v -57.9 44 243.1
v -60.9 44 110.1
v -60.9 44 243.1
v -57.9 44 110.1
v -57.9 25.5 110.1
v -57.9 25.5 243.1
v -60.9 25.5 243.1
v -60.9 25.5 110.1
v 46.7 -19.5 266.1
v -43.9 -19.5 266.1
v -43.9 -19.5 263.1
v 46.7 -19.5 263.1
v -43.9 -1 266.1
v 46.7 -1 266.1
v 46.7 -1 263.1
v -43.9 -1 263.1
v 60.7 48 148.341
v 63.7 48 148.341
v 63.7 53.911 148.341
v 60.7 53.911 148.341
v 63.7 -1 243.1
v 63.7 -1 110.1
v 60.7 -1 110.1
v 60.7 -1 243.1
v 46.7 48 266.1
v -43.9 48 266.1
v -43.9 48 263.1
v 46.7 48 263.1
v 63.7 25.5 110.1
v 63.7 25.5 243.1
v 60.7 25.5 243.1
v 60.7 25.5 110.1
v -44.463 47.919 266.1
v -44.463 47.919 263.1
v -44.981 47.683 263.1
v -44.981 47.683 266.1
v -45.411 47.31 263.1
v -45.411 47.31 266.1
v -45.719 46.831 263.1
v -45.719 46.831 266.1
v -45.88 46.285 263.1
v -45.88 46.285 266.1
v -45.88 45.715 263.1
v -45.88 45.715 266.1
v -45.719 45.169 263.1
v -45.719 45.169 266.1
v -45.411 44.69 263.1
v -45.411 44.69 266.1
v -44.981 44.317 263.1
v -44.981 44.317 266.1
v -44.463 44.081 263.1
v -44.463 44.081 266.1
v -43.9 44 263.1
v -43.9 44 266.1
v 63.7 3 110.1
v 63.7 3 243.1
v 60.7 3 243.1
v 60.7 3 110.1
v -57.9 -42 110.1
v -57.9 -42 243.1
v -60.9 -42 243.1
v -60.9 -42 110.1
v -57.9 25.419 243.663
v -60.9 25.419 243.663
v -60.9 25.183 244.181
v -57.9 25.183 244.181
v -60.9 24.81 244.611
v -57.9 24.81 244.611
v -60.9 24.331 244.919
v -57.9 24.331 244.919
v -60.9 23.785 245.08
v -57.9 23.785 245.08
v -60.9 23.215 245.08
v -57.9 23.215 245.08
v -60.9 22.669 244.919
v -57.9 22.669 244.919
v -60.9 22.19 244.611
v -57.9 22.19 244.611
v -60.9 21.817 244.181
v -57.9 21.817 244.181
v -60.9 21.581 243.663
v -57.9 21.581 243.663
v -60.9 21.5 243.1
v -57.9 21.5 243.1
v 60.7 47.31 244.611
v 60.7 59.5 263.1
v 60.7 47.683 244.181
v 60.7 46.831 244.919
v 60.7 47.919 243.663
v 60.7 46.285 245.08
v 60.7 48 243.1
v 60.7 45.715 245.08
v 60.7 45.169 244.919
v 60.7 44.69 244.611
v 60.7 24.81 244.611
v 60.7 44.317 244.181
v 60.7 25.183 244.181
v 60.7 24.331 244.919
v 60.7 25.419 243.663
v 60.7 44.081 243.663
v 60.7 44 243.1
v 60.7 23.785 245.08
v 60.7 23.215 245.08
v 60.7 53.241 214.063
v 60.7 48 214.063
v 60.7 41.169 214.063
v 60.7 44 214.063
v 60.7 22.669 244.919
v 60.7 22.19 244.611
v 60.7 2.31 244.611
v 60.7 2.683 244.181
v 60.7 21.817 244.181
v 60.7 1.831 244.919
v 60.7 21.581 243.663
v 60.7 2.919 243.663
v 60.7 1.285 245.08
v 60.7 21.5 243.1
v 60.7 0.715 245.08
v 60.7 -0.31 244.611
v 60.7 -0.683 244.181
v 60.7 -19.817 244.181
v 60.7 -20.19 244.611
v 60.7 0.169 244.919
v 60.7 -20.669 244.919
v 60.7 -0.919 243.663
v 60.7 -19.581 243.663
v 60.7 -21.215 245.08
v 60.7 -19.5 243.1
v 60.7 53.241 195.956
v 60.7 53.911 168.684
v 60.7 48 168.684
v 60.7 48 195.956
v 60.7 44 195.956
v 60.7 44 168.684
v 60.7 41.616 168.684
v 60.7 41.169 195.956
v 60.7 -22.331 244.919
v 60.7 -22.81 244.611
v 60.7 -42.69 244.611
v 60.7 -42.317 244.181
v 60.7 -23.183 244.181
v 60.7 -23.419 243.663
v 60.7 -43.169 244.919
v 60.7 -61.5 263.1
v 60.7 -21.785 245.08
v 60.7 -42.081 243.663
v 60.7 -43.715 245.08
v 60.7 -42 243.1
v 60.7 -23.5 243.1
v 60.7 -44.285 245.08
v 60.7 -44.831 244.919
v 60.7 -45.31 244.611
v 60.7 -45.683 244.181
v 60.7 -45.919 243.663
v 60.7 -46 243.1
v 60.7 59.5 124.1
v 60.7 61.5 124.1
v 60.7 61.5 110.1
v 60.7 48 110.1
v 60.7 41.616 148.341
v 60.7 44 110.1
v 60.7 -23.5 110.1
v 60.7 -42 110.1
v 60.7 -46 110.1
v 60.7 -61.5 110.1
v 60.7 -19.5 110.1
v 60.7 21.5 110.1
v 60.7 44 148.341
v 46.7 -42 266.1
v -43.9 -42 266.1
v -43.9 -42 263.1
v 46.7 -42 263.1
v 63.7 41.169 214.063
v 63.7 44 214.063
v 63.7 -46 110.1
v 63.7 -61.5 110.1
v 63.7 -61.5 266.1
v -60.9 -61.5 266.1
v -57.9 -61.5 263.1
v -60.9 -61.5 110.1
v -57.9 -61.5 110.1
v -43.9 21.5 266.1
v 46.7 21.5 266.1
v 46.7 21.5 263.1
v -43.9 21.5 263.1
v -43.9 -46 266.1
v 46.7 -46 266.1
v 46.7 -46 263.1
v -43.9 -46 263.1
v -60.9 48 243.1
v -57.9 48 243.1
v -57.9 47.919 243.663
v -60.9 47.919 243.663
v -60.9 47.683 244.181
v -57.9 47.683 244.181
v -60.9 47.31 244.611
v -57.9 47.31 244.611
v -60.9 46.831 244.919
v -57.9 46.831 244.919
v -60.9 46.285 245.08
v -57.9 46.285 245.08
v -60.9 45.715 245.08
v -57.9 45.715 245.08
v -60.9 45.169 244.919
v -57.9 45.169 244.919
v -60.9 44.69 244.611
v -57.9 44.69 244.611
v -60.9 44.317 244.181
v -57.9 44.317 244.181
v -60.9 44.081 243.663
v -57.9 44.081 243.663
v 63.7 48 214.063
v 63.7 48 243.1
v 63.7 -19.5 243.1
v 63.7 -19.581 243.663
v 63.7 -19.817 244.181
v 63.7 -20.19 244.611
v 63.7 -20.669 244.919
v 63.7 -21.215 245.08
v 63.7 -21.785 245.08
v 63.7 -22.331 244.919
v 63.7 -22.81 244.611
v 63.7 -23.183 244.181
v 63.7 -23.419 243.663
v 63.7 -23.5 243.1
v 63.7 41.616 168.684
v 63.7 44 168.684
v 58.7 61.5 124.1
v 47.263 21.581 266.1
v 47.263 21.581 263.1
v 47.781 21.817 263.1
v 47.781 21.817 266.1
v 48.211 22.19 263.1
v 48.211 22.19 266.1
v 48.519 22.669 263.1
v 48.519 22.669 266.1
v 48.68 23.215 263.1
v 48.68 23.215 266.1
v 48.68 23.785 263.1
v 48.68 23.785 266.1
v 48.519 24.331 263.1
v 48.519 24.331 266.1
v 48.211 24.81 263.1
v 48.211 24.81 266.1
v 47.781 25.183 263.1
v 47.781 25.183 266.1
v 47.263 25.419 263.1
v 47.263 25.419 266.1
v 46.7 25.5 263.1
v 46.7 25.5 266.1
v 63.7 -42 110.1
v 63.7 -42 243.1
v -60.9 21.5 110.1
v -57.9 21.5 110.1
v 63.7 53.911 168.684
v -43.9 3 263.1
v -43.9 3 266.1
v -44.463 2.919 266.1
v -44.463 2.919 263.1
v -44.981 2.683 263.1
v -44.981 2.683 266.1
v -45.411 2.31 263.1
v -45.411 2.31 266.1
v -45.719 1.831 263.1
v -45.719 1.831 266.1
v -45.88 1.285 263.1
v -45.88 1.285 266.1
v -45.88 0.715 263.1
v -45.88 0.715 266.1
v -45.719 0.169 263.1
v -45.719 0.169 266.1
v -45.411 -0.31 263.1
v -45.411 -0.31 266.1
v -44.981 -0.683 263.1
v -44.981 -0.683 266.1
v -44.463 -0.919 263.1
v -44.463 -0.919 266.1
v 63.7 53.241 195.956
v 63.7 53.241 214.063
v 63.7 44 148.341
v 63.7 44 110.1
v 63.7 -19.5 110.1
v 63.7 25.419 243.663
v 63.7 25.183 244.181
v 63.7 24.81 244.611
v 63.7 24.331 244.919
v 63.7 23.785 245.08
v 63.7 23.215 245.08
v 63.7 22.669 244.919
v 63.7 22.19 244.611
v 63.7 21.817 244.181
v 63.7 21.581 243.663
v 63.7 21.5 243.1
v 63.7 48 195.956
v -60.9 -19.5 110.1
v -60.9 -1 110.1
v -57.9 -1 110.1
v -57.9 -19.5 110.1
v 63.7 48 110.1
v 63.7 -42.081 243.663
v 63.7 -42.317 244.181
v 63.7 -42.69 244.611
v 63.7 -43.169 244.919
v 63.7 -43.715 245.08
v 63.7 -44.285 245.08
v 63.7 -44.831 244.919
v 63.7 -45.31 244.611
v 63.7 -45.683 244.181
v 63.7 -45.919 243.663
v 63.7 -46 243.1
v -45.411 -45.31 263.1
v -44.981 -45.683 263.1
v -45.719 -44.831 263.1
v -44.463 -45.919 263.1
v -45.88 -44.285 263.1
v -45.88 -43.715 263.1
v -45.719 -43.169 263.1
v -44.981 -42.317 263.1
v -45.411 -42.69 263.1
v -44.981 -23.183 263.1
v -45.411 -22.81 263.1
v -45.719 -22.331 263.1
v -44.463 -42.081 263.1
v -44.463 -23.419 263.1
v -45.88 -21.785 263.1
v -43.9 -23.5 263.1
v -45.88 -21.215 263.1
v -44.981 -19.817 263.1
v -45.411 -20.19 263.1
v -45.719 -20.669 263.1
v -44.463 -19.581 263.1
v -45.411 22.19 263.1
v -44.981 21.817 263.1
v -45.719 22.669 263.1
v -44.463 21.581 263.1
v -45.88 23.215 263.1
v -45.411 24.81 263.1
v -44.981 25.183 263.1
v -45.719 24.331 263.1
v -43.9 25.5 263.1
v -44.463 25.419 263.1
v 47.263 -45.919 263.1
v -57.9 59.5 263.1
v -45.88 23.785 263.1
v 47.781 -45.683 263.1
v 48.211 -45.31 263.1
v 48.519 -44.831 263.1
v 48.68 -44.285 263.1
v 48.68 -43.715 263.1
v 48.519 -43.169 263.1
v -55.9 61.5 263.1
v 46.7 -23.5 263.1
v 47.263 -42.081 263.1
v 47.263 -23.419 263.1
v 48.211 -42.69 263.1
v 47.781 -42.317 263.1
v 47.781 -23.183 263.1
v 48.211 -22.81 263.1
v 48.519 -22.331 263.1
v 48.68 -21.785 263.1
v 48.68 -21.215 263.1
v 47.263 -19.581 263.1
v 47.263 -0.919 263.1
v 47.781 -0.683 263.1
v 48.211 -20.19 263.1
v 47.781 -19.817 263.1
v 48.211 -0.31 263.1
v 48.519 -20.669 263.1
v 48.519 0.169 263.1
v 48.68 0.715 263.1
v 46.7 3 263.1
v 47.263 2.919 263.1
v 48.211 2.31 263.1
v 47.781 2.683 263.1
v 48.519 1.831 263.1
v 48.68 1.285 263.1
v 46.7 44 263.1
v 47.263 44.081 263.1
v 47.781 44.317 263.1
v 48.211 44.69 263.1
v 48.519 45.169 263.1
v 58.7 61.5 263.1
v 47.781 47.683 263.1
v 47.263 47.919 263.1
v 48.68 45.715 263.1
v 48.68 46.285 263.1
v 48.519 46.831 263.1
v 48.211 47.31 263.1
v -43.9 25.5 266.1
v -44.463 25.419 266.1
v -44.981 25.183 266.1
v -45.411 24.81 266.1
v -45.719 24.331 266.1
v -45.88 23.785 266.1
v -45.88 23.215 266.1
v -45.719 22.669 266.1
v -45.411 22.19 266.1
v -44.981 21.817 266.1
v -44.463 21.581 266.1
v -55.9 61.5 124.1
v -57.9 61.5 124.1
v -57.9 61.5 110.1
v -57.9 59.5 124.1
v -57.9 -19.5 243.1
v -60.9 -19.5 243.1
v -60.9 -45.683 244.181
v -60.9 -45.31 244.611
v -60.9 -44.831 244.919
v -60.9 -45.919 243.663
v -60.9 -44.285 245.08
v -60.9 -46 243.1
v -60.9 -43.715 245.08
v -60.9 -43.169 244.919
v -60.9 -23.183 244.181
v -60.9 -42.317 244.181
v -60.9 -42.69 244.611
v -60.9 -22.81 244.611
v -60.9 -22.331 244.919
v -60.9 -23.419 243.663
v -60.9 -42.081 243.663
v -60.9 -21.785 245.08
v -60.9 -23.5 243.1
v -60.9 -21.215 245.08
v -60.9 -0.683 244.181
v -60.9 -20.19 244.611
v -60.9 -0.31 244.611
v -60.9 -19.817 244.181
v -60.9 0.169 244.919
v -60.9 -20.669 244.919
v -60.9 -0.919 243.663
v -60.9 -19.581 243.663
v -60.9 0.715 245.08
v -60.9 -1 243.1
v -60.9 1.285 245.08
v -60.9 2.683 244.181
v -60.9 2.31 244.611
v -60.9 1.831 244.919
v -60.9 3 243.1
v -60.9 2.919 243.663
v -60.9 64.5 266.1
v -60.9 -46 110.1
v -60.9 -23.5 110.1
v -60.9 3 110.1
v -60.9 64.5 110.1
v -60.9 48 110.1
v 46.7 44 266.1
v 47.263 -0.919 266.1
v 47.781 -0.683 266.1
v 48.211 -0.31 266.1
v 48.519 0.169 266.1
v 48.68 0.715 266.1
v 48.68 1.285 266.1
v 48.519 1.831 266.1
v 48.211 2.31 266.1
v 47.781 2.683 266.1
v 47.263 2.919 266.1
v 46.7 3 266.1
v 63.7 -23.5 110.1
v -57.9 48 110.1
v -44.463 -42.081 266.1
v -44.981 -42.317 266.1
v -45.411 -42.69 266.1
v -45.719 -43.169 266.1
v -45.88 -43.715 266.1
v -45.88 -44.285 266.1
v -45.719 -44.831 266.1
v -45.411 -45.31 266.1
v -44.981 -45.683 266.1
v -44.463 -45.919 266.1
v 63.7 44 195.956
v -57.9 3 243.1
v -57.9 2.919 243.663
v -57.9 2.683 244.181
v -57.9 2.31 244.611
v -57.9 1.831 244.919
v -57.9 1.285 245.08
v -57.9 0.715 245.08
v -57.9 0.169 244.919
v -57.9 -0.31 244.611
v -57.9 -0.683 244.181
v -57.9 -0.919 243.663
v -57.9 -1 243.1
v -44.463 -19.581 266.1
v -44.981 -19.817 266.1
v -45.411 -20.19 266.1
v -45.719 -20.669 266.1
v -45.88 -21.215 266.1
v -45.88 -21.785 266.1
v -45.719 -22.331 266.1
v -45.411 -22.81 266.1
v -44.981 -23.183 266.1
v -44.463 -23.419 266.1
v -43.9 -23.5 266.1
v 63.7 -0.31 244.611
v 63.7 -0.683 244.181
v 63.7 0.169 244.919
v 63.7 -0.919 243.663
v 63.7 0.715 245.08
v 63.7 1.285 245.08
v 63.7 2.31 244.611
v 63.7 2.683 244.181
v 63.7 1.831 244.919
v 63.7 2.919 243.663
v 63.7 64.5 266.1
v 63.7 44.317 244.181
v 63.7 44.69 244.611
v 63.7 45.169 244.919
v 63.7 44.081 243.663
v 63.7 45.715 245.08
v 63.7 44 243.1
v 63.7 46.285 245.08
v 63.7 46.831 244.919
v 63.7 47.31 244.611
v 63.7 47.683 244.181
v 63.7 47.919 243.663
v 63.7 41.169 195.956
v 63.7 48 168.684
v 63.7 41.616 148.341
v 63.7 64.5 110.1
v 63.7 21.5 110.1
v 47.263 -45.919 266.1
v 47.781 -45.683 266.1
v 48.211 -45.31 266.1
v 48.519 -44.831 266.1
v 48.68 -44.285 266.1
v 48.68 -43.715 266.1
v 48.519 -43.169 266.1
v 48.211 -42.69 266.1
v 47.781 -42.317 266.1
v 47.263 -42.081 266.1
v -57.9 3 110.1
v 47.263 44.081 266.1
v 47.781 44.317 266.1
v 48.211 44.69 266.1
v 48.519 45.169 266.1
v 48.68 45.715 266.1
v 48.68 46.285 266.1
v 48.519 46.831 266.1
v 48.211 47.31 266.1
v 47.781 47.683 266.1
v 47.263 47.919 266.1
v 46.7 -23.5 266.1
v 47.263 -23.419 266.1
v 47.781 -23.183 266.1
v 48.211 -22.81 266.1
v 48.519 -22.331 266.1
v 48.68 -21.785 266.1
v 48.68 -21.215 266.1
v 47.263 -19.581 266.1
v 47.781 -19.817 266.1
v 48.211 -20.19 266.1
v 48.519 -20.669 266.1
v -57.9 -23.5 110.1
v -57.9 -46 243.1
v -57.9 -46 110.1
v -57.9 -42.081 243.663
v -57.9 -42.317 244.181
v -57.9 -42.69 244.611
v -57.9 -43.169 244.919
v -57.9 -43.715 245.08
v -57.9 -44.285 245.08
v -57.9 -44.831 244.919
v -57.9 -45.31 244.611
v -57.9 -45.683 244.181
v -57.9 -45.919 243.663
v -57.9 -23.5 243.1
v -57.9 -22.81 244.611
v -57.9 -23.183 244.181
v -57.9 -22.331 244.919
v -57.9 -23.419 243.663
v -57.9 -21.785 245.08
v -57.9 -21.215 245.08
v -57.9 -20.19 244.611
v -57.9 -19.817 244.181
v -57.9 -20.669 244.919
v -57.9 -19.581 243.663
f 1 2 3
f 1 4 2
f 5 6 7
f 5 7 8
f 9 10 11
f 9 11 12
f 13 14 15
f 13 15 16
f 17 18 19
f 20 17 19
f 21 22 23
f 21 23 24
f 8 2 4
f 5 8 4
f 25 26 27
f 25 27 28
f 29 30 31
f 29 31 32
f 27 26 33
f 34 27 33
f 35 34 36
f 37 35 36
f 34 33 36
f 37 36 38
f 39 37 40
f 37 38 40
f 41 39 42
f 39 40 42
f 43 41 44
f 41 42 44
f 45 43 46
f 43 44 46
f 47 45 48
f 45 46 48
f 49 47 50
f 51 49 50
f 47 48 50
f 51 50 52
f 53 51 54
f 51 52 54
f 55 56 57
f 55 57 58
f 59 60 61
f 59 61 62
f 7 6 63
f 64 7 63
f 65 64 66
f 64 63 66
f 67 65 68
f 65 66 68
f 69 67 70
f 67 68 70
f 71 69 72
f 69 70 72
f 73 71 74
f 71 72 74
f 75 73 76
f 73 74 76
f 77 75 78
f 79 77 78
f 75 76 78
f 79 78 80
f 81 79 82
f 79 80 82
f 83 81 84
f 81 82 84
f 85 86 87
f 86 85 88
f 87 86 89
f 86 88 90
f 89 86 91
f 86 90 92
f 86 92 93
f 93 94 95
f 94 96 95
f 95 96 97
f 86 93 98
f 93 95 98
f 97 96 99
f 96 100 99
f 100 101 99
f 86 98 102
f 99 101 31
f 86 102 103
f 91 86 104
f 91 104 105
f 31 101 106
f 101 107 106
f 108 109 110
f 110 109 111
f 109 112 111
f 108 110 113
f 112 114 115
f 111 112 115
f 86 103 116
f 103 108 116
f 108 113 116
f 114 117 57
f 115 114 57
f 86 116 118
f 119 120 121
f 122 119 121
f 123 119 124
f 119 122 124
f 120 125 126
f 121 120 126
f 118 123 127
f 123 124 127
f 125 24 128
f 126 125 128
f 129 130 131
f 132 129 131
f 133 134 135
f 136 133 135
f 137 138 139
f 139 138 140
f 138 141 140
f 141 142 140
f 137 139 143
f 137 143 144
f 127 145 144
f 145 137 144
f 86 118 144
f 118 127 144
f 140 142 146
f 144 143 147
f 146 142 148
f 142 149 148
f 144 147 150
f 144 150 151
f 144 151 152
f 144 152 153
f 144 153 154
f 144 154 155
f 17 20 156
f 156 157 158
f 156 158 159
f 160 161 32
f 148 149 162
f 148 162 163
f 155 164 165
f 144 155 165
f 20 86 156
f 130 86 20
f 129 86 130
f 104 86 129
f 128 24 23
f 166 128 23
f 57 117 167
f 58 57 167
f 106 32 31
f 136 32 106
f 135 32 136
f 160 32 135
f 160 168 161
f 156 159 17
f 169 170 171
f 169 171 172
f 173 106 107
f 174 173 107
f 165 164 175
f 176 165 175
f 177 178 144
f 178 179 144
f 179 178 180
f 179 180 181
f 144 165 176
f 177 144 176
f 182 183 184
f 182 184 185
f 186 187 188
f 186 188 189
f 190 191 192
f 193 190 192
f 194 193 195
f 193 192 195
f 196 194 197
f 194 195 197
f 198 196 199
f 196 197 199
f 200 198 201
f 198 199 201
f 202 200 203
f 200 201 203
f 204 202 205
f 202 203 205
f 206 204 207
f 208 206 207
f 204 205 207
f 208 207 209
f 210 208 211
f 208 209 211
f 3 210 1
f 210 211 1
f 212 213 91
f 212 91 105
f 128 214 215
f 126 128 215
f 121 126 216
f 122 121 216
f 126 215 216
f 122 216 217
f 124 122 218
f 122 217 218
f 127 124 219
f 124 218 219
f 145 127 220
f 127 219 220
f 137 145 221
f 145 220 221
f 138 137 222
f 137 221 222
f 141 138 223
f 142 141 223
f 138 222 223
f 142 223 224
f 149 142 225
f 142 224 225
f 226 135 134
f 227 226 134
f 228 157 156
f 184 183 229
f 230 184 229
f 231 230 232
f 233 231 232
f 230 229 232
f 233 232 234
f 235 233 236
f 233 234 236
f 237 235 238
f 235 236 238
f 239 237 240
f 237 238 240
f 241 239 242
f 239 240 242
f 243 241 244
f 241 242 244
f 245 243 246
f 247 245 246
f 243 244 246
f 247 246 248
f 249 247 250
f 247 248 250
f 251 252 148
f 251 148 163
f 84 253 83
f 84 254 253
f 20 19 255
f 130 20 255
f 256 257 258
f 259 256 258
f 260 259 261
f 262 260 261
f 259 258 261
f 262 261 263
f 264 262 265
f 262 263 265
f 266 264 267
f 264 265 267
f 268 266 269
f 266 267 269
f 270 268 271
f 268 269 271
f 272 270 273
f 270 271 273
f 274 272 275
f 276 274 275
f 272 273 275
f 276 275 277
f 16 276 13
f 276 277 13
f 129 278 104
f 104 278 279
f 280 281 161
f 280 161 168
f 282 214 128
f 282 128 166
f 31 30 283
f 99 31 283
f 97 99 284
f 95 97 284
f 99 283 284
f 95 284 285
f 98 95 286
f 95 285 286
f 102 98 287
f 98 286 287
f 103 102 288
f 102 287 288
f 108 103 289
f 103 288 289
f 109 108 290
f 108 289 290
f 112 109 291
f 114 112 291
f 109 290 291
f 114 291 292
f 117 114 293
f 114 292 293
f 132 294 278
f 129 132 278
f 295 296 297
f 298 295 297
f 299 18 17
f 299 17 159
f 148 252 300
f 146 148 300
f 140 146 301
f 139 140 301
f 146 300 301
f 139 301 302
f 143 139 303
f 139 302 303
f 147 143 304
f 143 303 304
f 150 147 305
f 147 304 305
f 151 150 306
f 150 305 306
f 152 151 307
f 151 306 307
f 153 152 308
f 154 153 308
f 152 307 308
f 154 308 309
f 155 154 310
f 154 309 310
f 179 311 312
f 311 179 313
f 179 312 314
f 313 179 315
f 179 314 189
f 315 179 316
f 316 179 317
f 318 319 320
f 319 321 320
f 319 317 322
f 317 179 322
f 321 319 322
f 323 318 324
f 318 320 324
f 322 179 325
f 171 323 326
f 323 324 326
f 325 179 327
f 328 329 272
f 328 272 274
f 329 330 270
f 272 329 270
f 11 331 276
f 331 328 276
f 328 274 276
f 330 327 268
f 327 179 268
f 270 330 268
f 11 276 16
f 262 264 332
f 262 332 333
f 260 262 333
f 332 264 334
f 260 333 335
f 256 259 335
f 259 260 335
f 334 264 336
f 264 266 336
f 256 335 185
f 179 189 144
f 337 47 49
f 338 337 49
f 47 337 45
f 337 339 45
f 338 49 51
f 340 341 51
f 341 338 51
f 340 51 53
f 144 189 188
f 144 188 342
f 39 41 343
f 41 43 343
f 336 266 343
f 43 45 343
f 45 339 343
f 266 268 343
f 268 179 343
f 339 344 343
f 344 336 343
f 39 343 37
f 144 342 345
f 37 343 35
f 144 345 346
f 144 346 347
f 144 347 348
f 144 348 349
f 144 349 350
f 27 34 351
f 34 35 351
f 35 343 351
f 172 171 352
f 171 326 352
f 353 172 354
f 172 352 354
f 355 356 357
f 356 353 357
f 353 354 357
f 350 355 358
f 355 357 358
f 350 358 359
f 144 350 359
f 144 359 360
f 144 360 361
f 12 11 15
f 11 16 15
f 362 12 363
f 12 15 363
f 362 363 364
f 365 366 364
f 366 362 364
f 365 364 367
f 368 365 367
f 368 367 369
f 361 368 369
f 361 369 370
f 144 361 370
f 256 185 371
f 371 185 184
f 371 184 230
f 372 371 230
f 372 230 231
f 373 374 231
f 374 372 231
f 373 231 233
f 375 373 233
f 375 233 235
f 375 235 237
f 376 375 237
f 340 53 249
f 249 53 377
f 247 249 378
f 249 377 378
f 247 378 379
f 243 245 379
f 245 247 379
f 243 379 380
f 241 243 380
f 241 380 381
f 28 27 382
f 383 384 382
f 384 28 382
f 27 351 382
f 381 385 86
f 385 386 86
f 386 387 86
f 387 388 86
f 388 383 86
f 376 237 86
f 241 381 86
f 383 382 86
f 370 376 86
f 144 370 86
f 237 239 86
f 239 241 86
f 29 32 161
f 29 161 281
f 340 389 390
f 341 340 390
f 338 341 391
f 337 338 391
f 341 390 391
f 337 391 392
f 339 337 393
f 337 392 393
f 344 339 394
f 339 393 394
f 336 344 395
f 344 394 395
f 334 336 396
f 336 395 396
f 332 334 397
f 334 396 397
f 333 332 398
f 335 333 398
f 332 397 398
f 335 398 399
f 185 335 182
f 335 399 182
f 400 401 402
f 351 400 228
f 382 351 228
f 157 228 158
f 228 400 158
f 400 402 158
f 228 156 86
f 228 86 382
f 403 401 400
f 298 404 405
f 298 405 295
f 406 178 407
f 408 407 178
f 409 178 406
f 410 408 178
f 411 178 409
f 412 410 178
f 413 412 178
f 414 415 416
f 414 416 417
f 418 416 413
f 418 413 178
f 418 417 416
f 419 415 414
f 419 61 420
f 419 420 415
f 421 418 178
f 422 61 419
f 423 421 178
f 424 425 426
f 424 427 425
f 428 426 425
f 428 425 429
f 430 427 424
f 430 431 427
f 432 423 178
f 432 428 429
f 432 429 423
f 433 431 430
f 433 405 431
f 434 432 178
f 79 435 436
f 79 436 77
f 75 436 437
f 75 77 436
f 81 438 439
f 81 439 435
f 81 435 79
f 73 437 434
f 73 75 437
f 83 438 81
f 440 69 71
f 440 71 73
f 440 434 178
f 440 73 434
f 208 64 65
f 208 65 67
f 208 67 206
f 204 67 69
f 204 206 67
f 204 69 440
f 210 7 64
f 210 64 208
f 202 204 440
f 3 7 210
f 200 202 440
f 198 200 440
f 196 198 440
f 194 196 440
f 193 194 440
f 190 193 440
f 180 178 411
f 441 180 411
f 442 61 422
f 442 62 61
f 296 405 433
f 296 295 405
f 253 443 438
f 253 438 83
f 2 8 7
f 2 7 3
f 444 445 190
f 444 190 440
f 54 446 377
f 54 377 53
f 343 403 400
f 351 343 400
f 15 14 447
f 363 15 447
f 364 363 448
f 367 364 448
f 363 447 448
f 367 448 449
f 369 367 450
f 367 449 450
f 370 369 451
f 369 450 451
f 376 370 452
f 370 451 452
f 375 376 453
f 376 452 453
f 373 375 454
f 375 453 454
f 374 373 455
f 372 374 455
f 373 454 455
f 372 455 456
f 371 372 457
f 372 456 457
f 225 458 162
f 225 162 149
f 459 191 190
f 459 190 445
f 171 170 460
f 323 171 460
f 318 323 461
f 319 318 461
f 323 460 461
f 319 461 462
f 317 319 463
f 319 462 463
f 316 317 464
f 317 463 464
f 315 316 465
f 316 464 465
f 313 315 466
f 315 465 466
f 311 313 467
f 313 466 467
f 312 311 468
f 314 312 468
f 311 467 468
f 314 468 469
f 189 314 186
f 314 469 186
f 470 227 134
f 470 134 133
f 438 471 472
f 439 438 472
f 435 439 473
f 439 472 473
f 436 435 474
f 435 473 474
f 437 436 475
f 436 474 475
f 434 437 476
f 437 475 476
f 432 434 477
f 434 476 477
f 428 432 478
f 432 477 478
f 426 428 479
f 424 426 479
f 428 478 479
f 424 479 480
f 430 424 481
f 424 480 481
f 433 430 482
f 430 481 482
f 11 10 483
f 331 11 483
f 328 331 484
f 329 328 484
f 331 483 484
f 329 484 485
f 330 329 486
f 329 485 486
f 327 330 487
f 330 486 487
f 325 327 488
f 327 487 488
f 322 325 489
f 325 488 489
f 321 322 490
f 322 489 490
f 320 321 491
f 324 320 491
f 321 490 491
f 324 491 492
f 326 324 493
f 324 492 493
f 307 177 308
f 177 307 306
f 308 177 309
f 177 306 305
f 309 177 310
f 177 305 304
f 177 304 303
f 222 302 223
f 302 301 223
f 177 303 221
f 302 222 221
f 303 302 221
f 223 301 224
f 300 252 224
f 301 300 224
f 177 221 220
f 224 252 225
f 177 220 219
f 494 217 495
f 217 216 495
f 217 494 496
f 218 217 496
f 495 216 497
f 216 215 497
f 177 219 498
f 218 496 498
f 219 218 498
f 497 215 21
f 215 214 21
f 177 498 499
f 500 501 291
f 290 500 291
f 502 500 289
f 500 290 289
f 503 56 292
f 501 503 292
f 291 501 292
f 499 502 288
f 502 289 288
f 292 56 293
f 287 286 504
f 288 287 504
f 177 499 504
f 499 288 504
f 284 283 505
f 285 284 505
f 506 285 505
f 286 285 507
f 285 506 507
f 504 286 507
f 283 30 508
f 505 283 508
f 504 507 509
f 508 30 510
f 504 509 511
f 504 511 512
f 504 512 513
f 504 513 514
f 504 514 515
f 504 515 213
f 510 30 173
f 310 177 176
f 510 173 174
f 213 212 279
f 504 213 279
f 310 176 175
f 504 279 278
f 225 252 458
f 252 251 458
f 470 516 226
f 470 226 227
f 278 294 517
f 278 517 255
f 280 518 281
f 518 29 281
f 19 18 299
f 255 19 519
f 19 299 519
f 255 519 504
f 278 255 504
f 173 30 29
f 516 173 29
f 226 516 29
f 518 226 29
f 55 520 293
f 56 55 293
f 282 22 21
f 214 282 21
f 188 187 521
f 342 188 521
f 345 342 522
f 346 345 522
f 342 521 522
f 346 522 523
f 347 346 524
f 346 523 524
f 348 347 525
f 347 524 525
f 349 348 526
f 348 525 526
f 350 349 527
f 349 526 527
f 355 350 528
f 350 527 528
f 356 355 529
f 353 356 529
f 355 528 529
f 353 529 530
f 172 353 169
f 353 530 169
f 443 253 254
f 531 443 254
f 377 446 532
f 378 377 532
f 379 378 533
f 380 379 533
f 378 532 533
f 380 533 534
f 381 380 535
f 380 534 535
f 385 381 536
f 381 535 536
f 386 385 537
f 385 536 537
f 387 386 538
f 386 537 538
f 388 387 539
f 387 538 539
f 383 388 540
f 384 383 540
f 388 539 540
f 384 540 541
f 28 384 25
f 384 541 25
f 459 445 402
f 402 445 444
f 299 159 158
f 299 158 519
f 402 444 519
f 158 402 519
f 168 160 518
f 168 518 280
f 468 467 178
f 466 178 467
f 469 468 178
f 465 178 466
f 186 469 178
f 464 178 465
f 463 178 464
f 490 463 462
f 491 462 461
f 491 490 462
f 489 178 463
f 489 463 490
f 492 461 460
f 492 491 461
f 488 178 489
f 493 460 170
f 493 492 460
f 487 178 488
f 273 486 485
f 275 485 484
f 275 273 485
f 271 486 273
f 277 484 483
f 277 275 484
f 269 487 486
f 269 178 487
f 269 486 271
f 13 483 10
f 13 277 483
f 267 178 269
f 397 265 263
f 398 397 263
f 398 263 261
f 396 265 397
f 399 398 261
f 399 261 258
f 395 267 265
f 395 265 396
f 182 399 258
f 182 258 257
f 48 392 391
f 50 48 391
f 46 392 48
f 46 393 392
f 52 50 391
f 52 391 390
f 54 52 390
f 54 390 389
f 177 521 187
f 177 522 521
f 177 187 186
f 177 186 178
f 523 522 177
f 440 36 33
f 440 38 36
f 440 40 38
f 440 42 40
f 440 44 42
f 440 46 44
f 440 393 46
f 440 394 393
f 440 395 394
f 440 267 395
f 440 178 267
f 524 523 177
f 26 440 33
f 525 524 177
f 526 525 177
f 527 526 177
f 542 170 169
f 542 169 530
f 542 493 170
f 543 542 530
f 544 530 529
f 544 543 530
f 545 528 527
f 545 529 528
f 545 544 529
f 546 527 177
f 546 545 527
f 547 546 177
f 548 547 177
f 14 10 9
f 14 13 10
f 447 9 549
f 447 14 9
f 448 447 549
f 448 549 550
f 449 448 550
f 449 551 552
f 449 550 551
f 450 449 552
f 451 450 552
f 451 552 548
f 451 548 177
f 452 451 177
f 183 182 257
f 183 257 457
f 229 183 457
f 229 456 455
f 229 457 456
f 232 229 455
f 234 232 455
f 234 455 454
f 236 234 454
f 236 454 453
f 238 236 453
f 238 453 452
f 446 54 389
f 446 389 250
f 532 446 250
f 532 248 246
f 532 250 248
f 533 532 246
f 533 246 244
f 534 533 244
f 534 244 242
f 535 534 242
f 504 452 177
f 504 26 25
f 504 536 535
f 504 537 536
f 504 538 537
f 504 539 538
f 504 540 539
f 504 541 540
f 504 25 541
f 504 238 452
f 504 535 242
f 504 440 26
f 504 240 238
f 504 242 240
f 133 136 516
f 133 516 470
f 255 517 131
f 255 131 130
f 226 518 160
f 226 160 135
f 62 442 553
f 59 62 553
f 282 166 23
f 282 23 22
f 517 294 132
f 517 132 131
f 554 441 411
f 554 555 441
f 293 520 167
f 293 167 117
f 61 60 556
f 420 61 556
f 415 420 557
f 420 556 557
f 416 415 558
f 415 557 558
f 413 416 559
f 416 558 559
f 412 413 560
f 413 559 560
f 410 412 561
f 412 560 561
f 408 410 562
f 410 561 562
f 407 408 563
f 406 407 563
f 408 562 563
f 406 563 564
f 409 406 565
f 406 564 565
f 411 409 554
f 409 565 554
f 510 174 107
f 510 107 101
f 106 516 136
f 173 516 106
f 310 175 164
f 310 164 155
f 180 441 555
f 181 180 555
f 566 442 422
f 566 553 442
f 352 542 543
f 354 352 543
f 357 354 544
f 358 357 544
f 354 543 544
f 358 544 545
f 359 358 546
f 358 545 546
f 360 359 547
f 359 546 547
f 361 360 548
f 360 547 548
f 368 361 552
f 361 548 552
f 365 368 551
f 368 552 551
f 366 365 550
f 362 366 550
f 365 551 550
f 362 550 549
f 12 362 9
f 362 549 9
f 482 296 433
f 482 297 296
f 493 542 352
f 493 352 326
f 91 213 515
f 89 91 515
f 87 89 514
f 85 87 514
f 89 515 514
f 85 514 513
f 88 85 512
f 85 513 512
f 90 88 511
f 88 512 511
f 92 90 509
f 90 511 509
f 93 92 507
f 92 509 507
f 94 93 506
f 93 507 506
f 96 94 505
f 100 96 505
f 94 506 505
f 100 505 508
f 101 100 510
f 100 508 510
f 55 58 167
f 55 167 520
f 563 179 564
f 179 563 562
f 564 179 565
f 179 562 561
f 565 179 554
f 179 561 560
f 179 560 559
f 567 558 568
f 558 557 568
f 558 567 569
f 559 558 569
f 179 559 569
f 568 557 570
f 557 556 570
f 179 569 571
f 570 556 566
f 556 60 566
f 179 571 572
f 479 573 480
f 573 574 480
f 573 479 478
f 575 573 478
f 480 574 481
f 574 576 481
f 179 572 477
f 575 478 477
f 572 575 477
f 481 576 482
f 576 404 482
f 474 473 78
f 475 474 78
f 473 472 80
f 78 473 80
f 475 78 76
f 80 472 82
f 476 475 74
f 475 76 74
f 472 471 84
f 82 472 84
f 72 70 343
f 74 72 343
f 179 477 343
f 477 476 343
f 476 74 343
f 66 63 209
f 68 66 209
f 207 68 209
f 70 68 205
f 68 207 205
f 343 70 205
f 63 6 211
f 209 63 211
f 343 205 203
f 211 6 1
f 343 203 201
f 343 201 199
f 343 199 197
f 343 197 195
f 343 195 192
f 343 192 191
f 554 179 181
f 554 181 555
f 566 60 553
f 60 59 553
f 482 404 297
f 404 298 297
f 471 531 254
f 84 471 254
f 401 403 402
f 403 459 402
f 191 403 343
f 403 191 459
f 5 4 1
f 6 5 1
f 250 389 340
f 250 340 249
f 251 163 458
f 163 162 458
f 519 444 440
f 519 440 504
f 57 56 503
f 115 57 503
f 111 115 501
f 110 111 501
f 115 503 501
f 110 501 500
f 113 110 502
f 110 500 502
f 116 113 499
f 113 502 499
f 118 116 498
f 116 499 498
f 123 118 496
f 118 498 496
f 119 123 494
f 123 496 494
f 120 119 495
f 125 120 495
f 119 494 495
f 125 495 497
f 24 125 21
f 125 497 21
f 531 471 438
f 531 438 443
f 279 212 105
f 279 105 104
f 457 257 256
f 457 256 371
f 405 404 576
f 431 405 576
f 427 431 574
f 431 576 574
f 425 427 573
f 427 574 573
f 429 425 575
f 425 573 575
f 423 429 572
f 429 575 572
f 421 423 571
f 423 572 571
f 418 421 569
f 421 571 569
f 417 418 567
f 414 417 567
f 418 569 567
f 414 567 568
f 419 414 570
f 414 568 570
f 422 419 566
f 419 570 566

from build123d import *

# Parameters (mm, degrees)
PAD004_DEPTH           = 153
PAD005_DEPTH           = 139
SKETCH007_W            = 124.6
SKETCH007_H            = 126
PAD006_DEPTH           = 3
POCKET002_DEPTH        = 124.601
LINEARPATTERN001_COUNT = 5
LINEARPATTERN001_PITCH = 22.5
POCKET003_DEPTH        = 4
LINEARPATTERN002_COUNT = 5
LINEARPATTERN002_PITCH = 22.5
SKETCH015_R            = 2
POCKET006_DEPTH        = 5
SKETCH016_W            = 12.294895
SKETCH016_H            = 20.342453
SKETCH016_W_2          = 12.071362
SKETCH016_H_2          = 18.107025
POCKET008_DEPTH        = 5


with BuildPart() as part:
    # Sketch006 → Pad004 (new body)
    with BuildSketch(Plane.XY):
        Polygon((62.3, 64.5), (-62.3, 64.5), (-62.3, -61.5), (-59.3, -61.5), (-59.3, 61.5), (59.3, 61.5), (59.3, -61.5), (62.3, -61.5), align=None)
    extrude(amount=PAD004_DEPTH)

    # Sketch008 (on DatumPlane) → Pad005 (join)
    with BuildSketch(Plane.XY.offset(153)):
        Polygon((-59.3, 59.5), (-57.299999, 61.5), (-59.3, 61.5), align=None)
    pad005 = extrude(amount=-PAD005_DEPTH)

    # Mirrored001: Pad005 across Sketch008 V_Axis
    add(pad005.mirror(Plane(origin=(0, 0, 153), x_dir=(0, 0, 1), z_dir=(1, 0, 0))))

    # Sketch007 (on DatumPlane) → Pad006 (join)
    with BuildSketch(Plane.XY.offset(153)):
        with Locations((0, 1.5)):
            Rectangle(SKETCH007_W, SKETCH007_H)
    extrude(amount=PAD006_DEPTH)

    # Sketch010 (on DatumPlane) → Pocket002 (cut, through all)
    with BuildSketch(Plane.YZ.offset(62.3)):
        with BuildLine():
            Line((-46, -89.527603), (-46, 133))
            ThreePointArc((-42, 133), (-44, 135), (-46, 133))
            Line((-42, 133), (-42, -89.527603))
            ThreePointArc((-46, -89.527603), (-44, -91.527603), (-42, -89.527603))
        make_face()
    pocket002 = extrude(amount=-POCKET002_DEPTH, mode=Mode.SUBTRACT)

    # LinearPattern001: Pocket002 ×5
    with Locations(*[(0, i * LINEARPATTERN001_PITCH, 0) for i in range(1, LINEARPATTERN001_COUNT)]):
        add(pocket002, mode=Mode.SUBTRACT)

    # Sketch011 (on Face13 of Pad006) → Pocket003 (cut)
    with BuildSketch(Plane.XY.offset(156)):
        with BuildLine():
            Line((-45.3, -42), (45.3, -42))
            ThreePointArc((45.3, -46), (47.3, -44), (45.3, -42))
            Line((45.3, -46), (-45.3, -46))
            ThreePointArc((-45.3, -42), (-47.3, -44), (-45.3, -46))
        make_face()
    pocket003 = extrude(amount=-POCKET003_DEPTH, mode=Mode.SUBTRACT)

    # LinearPattern002: Pocket003 ×5
    with Locations(*[(0, i * LINEARPATTERN002_PITCH, 0) for i in range(1, LINEARPATTERN002_COUNT)]):
        add(pocket003, mode=Mode.SUBTRACT)

    # Sketch015 (on DatumPlane) → Pocket006 (cut)
    with BuildSketch(Plane.XZ.offset(-64.5)):
        with Locations((-45.035357, 71.063824)):
            Circle(SKETCH015_R)
    extrude(amount=-POCKET006_DEPTH, mode=Mode.SUBTRACT)

    # Sketch016 (on DatumPlane) → Pocket008 (cut)
    with BuildSketch(Plane.YZ.offset(62.3)):
        with Locations((47.763846, 48.412672)):
            Rectangle(SKETCH016_W, SKETCH016_H)
        with Locations((47.204977, 94.909735)):
            Rectangle(SKETCH016_W_2, SKETCH016_H_2)
    extrude(amount=-POCKET008_DEPTH, mode=Mode.SUBTRACT)


with BuildPart() as part_1:
    # Body001 placement: moved
    add(part.part.moved(Location((1.4, 0, 110.1))))


solid = part_1.part
